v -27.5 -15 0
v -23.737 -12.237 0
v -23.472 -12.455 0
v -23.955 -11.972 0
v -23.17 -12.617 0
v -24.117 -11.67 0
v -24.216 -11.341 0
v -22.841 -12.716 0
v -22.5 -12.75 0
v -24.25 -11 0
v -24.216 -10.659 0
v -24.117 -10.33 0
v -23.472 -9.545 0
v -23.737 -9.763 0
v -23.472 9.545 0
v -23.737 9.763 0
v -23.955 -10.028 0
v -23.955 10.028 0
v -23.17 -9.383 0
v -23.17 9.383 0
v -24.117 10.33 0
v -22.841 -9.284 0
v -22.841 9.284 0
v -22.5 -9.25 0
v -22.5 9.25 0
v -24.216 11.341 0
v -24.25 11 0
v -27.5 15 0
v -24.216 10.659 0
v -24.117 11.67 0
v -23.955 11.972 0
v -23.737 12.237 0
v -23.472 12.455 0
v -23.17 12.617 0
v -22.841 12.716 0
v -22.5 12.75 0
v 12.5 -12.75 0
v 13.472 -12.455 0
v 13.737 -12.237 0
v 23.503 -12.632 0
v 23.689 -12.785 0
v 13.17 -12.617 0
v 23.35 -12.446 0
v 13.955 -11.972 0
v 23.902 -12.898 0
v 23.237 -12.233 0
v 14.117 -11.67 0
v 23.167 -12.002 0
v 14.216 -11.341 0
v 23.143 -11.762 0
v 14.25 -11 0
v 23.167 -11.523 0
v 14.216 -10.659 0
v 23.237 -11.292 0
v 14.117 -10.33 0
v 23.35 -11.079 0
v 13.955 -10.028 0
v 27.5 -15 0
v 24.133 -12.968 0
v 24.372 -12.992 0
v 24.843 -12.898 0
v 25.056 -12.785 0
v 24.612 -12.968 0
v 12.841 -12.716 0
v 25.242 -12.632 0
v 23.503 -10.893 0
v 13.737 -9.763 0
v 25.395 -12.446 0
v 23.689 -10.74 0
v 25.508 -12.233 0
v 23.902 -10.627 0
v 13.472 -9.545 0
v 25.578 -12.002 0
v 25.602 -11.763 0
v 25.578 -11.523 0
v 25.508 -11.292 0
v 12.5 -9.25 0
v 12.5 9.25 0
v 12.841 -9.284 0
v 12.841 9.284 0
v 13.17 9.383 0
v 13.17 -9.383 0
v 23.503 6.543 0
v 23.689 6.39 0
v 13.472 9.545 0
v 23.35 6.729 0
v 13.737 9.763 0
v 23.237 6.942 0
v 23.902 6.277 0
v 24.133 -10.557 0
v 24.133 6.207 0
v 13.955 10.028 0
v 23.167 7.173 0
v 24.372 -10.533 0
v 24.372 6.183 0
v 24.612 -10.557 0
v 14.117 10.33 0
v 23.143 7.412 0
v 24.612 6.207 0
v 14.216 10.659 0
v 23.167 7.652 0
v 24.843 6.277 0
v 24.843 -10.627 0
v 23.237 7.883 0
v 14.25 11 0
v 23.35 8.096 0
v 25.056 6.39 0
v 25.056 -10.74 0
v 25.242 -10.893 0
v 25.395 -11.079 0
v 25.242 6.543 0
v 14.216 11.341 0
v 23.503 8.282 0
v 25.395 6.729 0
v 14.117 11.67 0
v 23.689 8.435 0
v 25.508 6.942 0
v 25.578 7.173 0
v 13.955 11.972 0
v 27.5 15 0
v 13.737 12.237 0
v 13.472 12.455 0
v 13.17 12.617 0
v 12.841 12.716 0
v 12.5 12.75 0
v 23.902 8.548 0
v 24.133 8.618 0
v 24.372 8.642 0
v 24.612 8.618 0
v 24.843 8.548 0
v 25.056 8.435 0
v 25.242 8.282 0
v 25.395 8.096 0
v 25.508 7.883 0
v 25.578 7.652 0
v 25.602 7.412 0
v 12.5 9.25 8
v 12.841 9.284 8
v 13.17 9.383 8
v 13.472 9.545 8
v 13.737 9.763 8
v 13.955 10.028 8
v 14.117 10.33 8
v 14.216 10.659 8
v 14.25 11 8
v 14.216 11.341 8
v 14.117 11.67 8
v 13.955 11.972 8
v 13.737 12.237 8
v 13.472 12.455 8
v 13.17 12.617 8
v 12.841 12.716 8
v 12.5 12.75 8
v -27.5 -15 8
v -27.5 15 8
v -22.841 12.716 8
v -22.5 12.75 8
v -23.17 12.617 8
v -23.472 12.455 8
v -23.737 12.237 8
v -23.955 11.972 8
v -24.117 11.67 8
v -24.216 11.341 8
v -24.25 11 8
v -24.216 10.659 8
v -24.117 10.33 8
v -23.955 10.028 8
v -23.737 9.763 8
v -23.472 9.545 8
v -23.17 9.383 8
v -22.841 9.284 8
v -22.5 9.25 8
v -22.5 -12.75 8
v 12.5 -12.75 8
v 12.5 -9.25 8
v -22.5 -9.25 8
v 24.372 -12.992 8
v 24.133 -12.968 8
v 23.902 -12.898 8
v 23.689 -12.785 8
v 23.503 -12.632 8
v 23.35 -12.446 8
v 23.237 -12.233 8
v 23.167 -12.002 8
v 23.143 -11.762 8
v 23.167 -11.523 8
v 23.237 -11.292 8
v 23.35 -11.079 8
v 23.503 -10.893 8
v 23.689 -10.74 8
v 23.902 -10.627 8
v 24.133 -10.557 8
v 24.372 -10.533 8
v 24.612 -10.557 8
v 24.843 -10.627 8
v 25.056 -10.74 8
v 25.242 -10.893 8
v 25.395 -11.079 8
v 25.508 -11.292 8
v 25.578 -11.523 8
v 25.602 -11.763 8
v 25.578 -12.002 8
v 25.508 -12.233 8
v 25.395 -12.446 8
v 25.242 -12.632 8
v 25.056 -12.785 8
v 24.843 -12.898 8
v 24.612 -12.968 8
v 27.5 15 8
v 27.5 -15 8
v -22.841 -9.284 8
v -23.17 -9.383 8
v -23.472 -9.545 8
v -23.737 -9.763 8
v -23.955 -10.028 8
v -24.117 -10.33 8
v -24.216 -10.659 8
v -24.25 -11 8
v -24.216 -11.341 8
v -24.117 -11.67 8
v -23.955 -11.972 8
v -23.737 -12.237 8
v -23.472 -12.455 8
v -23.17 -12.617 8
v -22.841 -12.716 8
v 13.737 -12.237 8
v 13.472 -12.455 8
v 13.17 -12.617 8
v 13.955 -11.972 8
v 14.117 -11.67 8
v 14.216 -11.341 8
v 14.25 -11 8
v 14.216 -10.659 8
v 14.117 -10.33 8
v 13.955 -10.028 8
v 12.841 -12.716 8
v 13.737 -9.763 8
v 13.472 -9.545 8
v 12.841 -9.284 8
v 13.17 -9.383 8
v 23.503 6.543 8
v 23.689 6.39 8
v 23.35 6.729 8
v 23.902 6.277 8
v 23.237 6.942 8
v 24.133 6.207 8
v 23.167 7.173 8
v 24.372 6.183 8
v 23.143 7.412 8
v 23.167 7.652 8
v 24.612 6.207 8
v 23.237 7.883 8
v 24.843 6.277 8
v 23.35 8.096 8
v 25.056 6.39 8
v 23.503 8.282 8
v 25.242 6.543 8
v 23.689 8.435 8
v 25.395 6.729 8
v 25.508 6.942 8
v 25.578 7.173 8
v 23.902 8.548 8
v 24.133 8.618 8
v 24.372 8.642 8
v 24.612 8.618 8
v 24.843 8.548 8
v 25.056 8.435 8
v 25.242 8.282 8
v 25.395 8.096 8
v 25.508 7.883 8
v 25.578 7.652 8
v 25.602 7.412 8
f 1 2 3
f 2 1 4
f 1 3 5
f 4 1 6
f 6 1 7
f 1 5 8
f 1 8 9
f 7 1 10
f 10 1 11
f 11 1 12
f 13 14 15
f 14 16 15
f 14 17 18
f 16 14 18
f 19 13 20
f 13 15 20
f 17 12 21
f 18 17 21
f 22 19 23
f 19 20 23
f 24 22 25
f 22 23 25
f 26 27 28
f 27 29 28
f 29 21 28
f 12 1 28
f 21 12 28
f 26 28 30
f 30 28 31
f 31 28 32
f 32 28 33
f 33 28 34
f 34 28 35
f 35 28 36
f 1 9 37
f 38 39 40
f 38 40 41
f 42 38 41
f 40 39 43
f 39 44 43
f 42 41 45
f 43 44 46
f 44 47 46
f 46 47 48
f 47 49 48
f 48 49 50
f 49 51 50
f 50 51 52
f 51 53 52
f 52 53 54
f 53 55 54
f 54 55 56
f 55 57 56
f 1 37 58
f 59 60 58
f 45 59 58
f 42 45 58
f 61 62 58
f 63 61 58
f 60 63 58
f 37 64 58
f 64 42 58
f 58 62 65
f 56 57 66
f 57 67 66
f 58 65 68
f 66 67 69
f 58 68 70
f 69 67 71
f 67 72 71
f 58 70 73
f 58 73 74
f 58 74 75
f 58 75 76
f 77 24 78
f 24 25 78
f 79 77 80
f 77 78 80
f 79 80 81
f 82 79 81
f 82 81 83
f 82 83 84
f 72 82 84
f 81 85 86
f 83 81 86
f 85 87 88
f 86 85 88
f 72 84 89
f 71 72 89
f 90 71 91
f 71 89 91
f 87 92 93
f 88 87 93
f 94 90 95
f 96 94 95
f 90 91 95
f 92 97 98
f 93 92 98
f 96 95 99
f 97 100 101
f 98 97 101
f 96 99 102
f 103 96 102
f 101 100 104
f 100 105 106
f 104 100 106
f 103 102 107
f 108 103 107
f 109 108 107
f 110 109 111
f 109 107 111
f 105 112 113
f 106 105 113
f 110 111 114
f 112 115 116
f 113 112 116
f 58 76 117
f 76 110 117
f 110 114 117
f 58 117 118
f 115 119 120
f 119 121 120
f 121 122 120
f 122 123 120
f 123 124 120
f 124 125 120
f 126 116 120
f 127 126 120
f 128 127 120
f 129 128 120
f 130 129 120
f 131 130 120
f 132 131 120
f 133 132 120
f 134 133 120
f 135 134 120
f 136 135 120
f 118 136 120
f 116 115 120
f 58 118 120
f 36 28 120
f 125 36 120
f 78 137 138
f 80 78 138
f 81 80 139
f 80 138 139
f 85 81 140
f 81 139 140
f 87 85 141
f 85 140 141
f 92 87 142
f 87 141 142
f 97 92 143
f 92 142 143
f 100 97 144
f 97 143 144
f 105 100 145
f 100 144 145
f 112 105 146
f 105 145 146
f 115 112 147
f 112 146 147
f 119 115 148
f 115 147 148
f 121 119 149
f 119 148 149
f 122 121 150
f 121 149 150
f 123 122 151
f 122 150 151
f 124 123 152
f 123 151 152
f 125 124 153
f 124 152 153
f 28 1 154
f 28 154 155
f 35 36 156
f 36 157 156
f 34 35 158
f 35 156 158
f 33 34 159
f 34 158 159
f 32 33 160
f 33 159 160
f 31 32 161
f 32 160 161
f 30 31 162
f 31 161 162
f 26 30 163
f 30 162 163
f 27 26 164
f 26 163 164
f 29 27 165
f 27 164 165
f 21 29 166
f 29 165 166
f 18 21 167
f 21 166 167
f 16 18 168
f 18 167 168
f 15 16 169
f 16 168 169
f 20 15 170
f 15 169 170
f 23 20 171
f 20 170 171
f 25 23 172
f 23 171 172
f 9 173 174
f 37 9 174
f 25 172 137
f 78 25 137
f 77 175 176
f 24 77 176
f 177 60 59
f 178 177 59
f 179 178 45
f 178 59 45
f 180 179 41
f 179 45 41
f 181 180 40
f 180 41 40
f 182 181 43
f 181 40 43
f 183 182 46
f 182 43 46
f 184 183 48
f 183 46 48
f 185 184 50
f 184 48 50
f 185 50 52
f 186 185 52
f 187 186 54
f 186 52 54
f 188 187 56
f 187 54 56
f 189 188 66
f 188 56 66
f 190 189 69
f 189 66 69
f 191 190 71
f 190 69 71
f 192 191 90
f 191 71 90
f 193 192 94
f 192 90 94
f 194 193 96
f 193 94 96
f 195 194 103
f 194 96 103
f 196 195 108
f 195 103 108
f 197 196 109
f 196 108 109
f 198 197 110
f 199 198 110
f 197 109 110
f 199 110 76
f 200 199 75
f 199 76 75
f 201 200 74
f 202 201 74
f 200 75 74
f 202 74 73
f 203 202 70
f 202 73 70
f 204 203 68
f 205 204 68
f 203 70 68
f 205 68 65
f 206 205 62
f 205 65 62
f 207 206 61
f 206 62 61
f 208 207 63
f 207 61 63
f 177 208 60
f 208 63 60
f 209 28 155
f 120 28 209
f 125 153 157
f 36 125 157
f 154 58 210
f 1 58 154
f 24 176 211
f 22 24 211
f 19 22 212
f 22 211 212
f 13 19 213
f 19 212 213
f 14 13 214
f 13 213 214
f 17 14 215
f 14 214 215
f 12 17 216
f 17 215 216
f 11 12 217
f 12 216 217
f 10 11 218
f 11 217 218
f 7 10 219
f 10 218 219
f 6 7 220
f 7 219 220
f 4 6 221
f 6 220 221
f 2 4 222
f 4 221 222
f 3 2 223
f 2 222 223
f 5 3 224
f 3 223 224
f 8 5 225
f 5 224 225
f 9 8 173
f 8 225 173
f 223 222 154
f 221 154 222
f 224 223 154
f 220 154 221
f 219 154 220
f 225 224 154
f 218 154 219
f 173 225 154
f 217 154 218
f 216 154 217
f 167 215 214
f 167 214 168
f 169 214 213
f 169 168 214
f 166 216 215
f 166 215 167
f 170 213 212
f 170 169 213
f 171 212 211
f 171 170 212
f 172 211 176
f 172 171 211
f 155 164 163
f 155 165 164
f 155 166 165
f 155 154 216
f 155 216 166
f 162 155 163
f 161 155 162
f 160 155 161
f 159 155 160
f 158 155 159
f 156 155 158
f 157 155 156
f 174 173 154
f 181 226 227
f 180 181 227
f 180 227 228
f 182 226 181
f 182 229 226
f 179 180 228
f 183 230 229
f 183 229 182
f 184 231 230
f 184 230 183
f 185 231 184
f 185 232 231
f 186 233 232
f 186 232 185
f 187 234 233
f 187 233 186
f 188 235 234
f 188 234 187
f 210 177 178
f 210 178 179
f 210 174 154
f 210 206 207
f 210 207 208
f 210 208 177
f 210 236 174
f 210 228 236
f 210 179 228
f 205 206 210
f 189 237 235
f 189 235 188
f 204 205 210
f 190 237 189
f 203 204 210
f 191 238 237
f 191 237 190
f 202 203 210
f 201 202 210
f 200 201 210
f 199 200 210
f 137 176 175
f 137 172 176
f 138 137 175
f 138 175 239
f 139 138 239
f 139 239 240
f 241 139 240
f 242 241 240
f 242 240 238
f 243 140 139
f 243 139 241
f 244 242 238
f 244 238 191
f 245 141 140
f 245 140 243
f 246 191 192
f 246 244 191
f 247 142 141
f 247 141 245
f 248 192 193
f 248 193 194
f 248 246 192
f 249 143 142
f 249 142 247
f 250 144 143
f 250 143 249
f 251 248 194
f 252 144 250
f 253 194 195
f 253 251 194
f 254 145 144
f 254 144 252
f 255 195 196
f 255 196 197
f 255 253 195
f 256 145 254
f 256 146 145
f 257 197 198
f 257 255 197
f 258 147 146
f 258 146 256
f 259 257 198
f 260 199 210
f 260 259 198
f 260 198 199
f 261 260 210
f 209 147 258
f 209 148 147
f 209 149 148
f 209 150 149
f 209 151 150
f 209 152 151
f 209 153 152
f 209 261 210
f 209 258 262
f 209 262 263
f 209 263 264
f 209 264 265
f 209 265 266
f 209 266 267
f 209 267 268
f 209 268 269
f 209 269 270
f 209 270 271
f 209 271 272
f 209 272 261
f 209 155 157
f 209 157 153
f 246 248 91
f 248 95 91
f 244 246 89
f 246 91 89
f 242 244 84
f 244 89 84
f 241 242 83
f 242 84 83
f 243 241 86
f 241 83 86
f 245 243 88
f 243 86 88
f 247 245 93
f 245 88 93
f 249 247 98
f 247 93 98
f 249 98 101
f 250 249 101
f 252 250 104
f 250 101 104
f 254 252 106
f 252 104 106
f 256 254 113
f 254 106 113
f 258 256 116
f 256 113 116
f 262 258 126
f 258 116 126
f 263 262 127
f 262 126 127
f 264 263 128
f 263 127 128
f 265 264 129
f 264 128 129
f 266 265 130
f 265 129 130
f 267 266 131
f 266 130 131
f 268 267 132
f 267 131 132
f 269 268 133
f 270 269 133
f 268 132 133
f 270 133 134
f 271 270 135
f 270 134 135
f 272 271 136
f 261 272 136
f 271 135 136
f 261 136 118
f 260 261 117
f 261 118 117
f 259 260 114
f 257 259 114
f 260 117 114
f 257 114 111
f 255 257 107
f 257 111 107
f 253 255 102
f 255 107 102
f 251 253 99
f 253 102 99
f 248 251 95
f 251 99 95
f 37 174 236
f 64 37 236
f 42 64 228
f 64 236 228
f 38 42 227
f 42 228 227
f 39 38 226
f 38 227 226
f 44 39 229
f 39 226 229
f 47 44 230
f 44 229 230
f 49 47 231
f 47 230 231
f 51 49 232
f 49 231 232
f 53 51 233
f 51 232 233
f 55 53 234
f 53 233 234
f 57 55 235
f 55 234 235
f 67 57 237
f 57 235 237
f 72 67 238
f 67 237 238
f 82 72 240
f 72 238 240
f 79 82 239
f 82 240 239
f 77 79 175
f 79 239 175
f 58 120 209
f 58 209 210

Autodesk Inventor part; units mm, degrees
ref_plane "YZ Plane" through (0, 0, 0) normal (1, 0, 0) x (0, 1, 0)
ref_plane "XZ Plane" through (0, 0, 0) normal (0, 1, 0) x (-1, 0, 0)
ref_plane "XY Plane" through (0, 0, 0) normal (0, 0, 1) x (1, 0, 0)
sketch "Sketch1" plane through (0, 0, 0) normal (0, 0, 1) x (1, 0, 0)
  line L0 (-27.5, 15) -> (27.5, 15)
  line L1 (27.5, 15) -> (27.5, -15)
  line L2 (27.5, -15) -> (-27.5, -15)
  line L3 (-27.5, -15) -> (-27.5, 15)
  point P0 (0, 0)
  point P1 (0, 15)
  point P2 (-27.5, 0)
  dimension "d0" = 55
  dimension "d1" = 30
extrude "Extrusion1" add sketch "Sketch1" along normal blind 8
sketch "Sketch5" plane through (0, 0, 8) normal (0, 0, 1) x (1, 0, 0)
  line L0 (12.5, 11) -> (-22.5, 11) construction
  line L1 (12.5, 12.75) -> (-22.5, 12.75)
  line L2 (-22.5, 9.25) -> (12.5, 9.25)
  arc A0 (12.5, 9.25) -> (12.5, 12.75) centre (12.5, 11) ccw
  arc A1 (-22.5, 12.75) -> (-22.5, 9.25) centre (-22.5, 11) ccw
  line L3 (12.5, -11) -> (-22.5, -11) construction
  line L4 (12.5, -9.25) -> (-22.5, -9.25)
  line L5 (-22.5, -12.75) -> (12.5, -12.75)
  arc A2 (12.5, -12.75) -> (12.5, -9.25) centre (12.5, -11) ccw
  arc A3 (-22.5, -9.25) -> (-22.5, -12.75) centre (-22.5, -11) ccw
  line L6 (27.5, 15) -> (-27.5, 15) projected
  line L7 (-27.5, -15) -> (27.5, -15) projected
  line L8 (-27.5, 15) -> (-27.5, -15) projected
  point P0 (0, 0)
  point P1 (-5, 11)
  point P2 (-5, -11)
  dimension "d29" = 3.5
  dimension "d30" = 4
  dimension "d31" = 4
  dimension "d33" = 35
  dimension "d36" = 5
extrude "Extrusion5" cut sketch "Sketch5" against normal blind 10
sketch "Sketch6" plane through (0, 0, 8) normal (0, 0, 1) x (1, 0, 0)
  circle A0 centre (24.3725, -11.7625) radius 1.7875
  circle A1 centre (24.3725, 7.4125) radius 1.7875
  line L0 (27.5, -15) -> (27.5, 15) projected
  point P0 (0, 0)
  dimension "d44" = 3.1275
hole "Hole1" at (24.3725, 7.4125, 8) at (24.3725, -11.7625, 8) direction (0, 0, -1) diameter 2.459 end through all thread size "M3x0.5" class "6H" standard "ISO Metric profile"
properties part number "0005-10-021 suport senzor z"
